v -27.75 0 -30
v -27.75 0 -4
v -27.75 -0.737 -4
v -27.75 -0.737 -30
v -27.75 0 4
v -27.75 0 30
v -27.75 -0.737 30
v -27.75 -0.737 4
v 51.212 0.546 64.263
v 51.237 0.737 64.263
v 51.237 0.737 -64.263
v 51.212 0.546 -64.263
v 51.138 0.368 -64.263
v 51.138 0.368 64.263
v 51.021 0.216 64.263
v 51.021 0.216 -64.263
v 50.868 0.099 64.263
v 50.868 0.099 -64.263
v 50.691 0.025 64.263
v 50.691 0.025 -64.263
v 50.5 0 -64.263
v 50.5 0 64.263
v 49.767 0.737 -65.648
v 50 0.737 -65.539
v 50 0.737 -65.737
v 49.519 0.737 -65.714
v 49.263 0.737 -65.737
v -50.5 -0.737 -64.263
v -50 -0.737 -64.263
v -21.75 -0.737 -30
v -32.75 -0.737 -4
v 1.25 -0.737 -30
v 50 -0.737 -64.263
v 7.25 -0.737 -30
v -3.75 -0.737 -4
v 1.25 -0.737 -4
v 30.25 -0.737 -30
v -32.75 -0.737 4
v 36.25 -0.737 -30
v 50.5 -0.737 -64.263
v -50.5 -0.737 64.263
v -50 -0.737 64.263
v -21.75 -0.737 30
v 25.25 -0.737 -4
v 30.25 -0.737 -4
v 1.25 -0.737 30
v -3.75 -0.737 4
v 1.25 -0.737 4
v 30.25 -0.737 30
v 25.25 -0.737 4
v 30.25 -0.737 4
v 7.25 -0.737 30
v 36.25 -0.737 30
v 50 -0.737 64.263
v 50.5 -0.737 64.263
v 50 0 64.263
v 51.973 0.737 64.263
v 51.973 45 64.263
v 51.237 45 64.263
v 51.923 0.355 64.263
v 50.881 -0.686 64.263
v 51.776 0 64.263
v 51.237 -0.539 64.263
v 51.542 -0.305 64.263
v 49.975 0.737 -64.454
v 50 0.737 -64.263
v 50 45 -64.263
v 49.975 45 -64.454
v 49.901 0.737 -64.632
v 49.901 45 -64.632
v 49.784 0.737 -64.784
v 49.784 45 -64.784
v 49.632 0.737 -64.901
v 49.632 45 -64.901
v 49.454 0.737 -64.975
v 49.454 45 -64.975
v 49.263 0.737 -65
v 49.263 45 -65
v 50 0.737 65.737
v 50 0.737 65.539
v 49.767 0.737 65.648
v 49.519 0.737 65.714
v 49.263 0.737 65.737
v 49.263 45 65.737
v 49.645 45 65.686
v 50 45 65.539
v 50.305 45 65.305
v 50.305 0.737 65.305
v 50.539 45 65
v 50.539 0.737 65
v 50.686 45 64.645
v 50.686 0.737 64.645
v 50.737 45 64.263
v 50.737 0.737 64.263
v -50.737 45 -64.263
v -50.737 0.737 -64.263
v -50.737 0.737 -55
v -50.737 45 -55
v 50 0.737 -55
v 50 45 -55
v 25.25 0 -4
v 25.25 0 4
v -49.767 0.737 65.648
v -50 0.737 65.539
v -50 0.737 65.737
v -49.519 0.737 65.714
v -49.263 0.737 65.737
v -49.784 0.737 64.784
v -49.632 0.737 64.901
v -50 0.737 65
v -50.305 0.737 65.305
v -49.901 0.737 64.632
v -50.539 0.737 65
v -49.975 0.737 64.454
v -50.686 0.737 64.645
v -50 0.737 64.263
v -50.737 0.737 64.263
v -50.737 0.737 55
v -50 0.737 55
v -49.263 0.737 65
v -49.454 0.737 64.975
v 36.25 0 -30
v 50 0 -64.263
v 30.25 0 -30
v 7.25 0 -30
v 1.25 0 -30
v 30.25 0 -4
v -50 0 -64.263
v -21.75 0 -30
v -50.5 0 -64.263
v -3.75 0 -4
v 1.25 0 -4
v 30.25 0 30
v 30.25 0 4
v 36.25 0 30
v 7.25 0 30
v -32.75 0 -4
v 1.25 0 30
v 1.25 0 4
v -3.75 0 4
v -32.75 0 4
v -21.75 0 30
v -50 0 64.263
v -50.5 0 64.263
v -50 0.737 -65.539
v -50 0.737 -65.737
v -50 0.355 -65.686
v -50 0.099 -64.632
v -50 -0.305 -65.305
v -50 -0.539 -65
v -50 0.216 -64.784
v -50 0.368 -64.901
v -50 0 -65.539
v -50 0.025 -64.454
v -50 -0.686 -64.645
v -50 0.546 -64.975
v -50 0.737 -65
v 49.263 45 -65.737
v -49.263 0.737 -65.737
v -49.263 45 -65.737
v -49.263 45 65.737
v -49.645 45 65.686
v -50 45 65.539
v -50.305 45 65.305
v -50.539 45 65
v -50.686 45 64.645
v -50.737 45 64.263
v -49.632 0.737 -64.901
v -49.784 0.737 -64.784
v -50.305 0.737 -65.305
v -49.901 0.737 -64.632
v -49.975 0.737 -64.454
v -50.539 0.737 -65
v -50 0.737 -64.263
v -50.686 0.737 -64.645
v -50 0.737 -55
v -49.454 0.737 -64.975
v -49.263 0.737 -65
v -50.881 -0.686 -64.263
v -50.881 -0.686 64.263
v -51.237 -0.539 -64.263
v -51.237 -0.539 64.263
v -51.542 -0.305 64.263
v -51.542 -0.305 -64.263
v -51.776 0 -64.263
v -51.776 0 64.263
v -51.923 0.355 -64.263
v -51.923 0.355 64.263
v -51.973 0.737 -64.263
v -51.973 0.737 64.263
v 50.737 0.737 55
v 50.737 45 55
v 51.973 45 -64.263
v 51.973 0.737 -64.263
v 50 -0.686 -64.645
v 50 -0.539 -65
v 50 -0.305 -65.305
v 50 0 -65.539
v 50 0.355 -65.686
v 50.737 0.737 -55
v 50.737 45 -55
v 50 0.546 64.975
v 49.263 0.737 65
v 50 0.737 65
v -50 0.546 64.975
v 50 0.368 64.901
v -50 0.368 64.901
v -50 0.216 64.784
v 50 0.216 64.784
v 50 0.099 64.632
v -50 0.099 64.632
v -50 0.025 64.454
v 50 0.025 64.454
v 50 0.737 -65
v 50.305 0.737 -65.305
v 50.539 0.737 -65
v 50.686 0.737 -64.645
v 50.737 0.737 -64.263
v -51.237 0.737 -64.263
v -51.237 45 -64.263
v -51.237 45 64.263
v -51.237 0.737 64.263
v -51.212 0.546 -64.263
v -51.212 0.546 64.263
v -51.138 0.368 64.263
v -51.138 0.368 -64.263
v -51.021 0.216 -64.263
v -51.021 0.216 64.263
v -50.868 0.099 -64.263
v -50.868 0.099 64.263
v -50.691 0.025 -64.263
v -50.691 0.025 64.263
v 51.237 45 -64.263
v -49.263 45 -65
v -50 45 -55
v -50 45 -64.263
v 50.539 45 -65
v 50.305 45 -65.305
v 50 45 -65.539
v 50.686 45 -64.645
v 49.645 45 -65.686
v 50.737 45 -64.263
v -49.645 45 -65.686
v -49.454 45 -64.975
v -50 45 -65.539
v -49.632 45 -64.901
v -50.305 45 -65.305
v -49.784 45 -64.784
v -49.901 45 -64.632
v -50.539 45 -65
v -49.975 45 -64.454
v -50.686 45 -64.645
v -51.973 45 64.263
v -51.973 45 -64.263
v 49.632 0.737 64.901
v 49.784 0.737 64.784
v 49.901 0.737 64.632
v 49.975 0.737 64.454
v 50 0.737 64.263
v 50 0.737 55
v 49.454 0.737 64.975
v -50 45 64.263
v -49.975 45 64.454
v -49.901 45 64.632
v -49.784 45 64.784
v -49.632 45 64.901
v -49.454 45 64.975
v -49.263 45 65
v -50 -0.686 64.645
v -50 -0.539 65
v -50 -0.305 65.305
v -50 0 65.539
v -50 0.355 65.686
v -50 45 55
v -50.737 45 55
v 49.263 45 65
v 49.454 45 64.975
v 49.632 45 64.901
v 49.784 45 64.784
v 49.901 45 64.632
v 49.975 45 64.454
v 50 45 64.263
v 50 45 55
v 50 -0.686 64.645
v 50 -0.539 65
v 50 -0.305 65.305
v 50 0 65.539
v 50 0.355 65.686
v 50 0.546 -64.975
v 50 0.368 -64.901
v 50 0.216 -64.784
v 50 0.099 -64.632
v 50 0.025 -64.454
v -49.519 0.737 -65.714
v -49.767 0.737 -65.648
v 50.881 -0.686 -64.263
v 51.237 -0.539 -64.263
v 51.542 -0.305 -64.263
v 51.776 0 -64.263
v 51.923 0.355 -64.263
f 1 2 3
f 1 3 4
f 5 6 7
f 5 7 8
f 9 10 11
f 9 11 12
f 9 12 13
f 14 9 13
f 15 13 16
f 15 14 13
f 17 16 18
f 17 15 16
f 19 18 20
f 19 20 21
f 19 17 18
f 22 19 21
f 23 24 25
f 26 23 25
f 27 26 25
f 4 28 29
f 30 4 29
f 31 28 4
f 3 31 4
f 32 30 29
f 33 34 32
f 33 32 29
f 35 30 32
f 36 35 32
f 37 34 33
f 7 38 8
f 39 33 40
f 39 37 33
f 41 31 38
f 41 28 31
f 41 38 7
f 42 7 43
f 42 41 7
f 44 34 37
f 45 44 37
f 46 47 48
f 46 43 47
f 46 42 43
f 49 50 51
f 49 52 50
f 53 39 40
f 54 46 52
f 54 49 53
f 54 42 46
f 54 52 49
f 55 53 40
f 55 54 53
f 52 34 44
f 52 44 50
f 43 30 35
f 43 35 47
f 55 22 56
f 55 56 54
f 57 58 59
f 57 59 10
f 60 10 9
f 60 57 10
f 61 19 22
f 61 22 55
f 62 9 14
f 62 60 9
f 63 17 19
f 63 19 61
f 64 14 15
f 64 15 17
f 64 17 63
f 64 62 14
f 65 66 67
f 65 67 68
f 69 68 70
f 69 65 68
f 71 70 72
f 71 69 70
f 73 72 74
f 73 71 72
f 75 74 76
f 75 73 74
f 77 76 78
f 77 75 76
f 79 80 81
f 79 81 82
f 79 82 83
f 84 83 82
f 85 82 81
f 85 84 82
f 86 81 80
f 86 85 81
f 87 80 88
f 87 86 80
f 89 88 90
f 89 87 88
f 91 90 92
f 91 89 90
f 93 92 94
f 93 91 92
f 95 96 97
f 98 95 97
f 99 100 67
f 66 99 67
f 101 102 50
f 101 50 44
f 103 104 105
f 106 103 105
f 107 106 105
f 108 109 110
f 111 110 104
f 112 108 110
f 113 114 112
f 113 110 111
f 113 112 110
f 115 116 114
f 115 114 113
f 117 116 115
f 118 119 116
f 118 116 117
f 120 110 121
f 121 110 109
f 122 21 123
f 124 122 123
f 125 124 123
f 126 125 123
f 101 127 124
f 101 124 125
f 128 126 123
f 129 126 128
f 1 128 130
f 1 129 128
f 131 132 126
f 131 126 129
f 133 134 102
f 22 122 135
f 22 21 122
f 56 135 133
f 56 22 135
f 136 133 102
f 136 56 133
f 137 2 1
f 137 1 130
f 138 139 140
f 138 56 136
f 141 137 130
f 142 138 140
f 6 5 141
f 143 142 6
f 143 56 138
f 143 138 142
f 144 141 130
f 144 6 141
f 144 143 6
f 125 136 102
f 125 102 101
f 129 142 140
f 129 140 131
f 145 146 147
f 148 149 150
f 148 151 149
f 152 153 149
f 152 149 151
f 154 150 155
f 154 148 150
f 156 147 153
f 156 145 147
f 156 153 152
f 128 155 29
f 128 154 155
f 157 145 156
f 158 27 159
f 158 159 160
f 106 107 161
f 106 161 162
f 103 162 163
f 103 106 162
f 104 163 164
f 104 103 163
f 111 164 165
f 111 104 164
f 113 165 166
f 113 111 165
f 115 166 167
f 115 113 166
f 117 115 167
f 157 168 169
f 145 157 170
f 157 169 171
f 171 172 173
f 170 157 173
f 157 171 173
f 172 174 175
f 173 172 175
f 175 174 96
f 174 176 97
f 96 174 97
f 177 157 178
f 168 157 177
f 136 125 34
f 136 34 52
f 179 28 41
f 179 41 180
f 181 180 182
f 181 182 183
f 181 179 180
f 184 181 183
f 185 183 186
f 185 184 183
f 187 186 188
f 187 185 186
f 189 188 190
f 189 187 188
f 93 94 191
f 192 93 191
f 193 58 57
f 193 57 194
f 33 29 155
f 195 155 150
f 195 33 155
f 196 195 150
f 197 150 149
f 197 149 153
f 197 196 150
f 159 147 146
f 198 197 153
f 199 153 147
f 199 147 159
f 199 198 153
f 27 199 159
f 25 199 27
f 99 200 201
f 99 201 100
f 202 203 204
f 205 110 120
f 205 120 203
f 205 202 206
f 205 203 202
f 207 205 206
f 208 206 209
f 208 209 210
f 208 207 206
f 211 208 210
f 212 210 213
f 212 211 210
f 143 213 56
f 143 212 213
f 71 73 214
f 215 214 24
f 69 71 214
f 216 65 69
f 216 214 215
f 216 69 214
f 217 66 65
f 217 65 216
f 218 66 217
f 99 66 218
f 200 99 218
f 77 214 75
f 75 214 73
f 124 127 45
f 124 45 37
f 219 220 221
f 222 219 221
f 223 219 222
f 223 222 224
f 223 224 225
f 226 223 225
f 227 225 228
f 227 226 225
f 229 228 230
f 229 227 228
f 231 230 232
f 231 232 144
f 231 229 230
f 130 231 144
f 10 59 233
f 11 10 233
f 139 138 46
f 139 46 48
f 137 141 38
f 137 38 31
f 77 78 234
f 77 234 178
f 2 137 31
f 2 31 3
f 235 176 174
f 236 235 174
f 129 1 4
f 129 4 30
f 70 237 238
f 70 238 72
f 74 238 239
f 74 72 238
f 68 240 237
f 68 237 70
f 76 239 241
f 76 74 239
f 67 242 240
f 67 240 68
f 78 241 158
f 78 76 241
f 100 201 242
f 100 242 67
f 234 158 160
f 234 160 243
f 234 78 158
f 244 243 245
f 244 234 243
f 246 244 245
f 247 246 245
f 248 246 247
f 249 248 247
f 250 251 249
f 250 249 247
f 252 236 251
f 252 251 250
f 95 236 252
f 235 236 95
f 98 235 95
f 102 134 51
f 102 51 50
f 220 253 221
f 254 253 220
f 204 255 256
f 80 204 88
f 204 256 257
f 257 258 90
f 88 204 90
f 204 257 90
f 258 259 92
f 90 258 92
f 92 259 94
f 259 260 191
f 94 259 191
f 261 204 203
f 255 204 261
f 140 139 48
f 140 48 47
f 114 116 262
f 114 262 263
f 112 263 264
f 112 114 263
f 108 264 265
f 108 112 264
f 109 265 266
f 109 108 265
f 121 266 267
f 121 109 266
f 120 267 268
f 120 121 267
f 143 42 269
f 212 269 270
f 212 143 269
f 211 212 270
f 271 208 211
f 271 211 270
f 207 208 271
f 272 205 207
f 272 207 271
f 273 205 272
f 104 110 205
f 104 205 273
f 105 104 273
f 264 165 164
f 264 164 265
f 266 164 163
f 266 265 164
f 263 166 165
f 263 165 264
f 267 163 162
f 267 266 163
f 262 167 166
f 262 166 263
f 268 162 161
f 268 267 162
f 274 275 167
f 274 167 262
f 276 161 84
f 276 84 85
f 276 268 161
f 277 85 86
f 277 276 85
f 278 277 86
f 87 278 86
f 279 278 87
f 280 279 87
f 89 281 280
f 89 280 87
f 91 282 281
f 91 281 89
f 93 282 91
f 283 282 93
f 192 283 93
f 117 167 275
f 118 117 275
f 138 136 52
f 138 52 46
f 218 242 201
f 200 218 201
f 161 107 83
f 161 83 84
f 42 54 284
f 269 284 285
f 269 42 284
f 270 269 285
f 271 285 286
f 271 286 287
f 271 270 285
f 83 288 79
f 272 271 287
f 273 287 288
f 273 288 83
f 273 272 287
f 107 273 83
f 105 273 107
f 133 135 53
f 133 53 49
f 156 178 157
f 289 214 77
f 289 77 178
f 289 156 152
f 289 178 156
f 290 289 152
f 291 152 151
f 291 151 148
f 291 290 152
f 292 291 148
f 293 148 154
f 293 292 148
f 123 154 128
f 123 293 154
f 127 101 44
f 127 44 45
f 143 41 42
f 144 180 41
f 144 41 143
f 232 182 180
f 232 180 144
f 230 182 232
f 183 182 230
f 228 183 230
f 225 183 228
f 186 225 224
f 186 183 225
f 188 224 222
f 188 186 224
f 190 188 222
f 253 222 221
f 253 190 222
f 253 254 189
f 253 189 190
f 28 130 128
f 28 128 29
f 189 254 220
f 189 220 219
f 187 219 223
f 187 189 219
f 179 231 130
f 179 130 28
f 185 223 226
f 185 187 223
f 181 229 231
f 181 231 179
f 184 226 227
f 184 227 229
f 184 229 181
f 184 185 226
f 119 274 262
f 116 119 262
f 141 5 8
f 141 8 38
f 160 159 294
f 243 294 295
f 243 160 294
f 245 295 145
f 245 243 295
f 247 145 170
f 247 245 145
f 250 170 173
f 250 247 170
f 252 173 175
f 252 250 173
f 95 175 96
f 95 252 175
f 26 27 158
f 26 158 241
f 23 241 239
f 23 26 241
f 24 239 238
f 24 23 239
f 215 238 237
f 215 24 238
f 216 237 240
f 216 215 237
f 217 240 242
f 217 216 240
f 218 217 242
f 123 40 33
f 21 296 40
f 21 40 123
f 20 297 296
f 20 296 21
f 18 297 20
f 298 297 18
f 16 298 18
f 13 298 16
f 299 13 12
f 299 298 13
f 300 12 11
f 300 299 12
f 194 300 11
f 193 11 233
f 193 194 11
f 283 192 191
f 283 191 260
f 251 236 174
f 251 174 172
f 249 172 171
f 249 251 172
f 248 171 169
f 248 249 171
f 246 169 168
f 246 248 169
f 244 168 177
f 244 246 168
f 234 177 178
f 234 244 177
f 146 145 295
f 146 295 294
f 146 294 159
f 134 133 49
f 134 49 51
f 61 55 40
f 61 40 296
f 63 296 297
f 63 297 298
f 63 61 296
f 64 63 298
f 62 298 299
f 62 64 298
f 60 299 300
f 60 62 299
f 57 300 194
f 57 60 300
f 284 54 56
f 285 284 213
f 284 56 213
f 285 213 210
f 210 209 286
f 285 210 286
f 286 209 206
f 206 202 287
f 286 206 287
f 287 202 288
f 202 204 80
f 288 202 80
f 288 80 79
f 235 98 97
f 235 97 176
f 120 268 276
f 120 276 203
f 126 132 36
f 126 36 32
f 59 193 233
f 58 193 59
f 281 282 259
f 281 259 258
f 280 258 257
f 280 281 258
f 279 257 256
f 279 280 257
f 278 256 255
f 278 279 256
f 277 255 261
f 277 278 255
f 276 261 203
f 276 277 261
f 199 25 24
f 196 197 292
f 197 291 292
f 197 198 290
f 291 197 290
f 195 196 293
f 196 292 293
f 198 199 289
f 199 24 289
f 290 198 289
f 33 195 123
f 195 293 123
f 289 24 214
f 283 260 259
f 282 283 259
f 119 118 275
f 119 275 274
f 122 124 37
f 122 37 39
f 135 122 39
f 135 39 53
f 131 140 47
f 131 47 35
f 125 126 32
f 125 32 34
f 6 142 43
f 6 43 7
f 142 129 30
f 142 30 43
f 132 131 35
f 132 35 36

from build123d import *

# Parameters (mm, degrees)
SKETCH1_W                        = 100
SKETCH1_H                        = 130
BASE_FLANGE1_DEPTH               = 0.7366
BOX_REAR_STRIP_W                 = 4.4196
BOX_REAR_STRIP_H                 = 0.7366
BOX_REAR_STRIP_CUT_DEPTH         = 100
BOX_REAR_DEPTH                   = 100
BOX_FRONT_STRIP_W                = 4.4196
BOX_FRONT_STRIP_H                = 0.7366
BOX_FRONT_STRIP_CUT_DEPTH        = 100
BOX_FRONT_DEPTH                  = 100
BOX_FRONT_TABS_STRIP_W           = 4.4196
BOX_FRONT_TABS_STRIP_H           = 0.7366
BOX_FRONT_TABS_STRIP_CUT_DEPTH   = 44.2634
BOX_FRONT_TABS_STRIP_2_W         = 4.4196
BOX_FRONT_TABS_STRIP_2_H         = 0.7366
BOX_FRONT_TABS_STRIP_CUT_2_DEPTH = 44.2634
BOX_FRONT_TABS_DEPTH             = 44.2634
BOX_FRONT_TABS_BEND_DEPTH        = 44.2634
BOX_REAR_TABS_STRIP_W            = 4.4196
BOX_REAR_TABS_STRIP_H            = 0.7366
BOX_REAR_TABS_STRIP_CUT_DEPTH    = 44.2634
BOX_REAR_TABS_STRIP_2_W          = 4.4196
BOX_REAR_TABS_STRIP_2_H          = 0.7366
BOX_REAR_TABS_STRIP_CUT_2_DEPTH  = 44.2634
BOX_REAR_TABS_DEPTH              = 44.2634
BOX_REAR_TABS_BEND_DEPTH         = 44.2634
EDGE_FLANGE6_DEPTH               = 128.5268
EDGE_FLANGE6_START               = 0.7366
EDGE_FLANGE6_FLAT_DEPTH          = 0.7366
EDGE_FLANGE6_BEND_DEPTH          = 128.5268
EDGE_FLANGE6_FLAT_2_DEPTH        = 0.7366


# Sheet-metal steps are written as plain solids
with BuildPart() as part:
    # Sketch1 → Base-Flange1 (new body)
    with BuildSketch(Plane(origin=(0, 0, 0), x_dir=(1, 0, 0), z_dir=(0, 1, 0))):
        Rectangle(SKETCH1_W, SKETCH1_H)
        Polygon((1.25, 30), (7.25, 30), (7.25, -30), (1.25, -30), (1.25, -4), (-3.75, -4), (-3.75, 4), (1.25, 4), align=None, mode=Mode.SUBTRACT)
        Polygon((30.25, 30), (36.25, 30), (36.25, -30), (30.25, -30), (30.25, -4), (25.25, -4), (25.25, 4), (30.25, 4), align=None, mode=Mode.SUBTRACT)
        Polygon((-27.75, 30), (-21.75, 30), (-21.75, -30), (-27.75, -30), (-27.75, -4), (-32.75, -4), (-32.75, 4), (-27.75, 4), align=None, mode=Mode.SUBTRACT)
    extrude(amount=-BASE_FLANGE1_DEPTH)

    # Box rear strip (across the edge) → Box rear strip cut (cut)
    with BuildSketch(Plane(origin=(50, 0, -65), x_dir=(0, 0, 1), z_dir=(-1, 0, 0))):
        with Locations((-1.4732, -0.3683)):
            Rectangle(BOX_REAR_STRIP_W, BOX_REAR_STRIP_H)
    extrude(amount=BOX_REAR_STRIP_CUT_DEPTH, mode=Mode.SUBTRACT)

    # Box rear section (across the edge) → Box rear (add)
    with BuildSketch(Plane(origin=(50, 0, -65), x_dir=(0, 0, 1), z_dir=(-1, 0, 0))):
        with BuildLine():
            Line((-0.7366, 0.7366), (-0.7366, 45))
            Line((-0.7366, 45), (0, 45))
            Line((0, 45), (0, 0.7366))
            ThreePointArc((0, 0.7366), (0.215745145, 0.215745145), (0.7366, 0))
            Line((0.7366, 0), (0.7366, -0.7366))
            ThreePointArc((0.7366, -0.7366), (-0.30510971, -0.30510971), (-0.7366, 0.7366))
        make_face()
    extrude(amount=BOX_REAR_DEPTH)

    # Box front strip (across the edge) → Box front strip cut (cut)
    with BuildSketch(Plane(origin=(-50, 0, 65), x_dir=(0, 0, -1), z_dir=(1, 0, 0))):
        with Locations((-1.4732, -0.3683)):
            Rectangle(BOX_FRONT_STRIP_W, BOX_FRONT_STRIP_H)
    extrude(amount=BOX_FRONT_STRIP_CUT_DEPTH, mode=Mode.SUBTRACT)

    # Box front section (across the edge) → Box front (add)
    with BuildSketch(Plane(origin=(-50, 0, 65), x_dir=(0, 0, -1), z_dir=(1, 0, 0))):
        with BuildLine():
            Line((-0.7366, 0.7366), (-0.7366, 45))
            Line((-0.7366, 45), (0, 45))
            Line((0, 45), (0, 0.7366))
            ThreePointArc((0, 0.7366), (0.215745145, 0.215745145), (0.7366, 0))
            Line((0.7366, 0), (0.7366, -0.7366))
            ThreePointArc((0.7366, -0.7366), (-0.30510971, -0.30510971), (-0.7366, 0.7366))
        make_face()
    extrude(amount=BOX_FRONT_DEPTH)

    # Box-front tabs strip (across the edge) → Box-front tabs strip cut (cut)
    with BuildSketch(Plane(origin=(-50, 0.7366, 65), x_dir=(1, 0, 0), z_dir=(0, 1, 0))):
        with Locations((-1.4732, -0.3683)):
            Rectangle(BOX_FRONT_TABS_STRIP_W, BOX_FRONT_TABS_STRIP_H)
    extrude(amount=BOX_FRONT_TABS_STRIP_CUT_DEPTH, mode=Mode.SUBTRACT)

    # Box-front tabs strip 2 (across the edge) → Box-front tabs strip cut 2 (cut)
    with BuildSketch(Plane(origin=(50, 45, 65), x_dir=(-1, 0, 0), z_dir=(0, -1, 0))):
        with Locations((-1.4732, -0.3683)):
            Rectangle(BOX_FRONT_TABS_STRIP_2_W, BOX_FRONT_TABS_STRIP_2_H)
    extrude(amount=BOX_FRONT_TABS_STRIP_CUT_2_DEPTH, mode=Mode.SUBTRACT)

    # Box-front tabs section (across the edge) → Box-front tabs (add)
    with BuildSketch(Plane(origin=(-50, 0.7366, 65), x_dir=(1, 0, 0), z_dir=(0, 1, 0))):
        with BuildLine():
            Line((-0.7366, 0.7366), (-0.7366, 10))
            Line((-0.7366, 10), (0, 10))
            Line((0, 10), (0, 0.7366))
            ThreePointArc((0, 0.7366), (0.215745145, 0.215745145), (0.7366, 0))
            Line((0.7366, 0), (0.7366, -0.7366))
            ThreePointArc((0.7366, -0.7366), (-0.30510971, -0.30510971), (-0.7366, 0.7366))
        make_face()
    extrude(amount=BOX_FRONT_TABS_DEPTH)

    # Box-front tabs section 2 (across the edge) → Box-front tabs bend (add)
    with BuildSketch(Plane(origin=(50, 45, 65), x_dir=(-1, 0, 0), z_dir=(0, -1, 0))):
        with BuildLine():
            Line((-0.7366, 0.7366), (-0.7366, 10))
            Line((-0.7366, 10), (0, 10))
            Line((0, 10), (0, 0.7366))
            ThreePointArc((0, 0.7366), (0.215745145, 0.215745145), (0.7366, 0))
            Line((0.7366, 0), (0.7366, -0.7366))
            ThreePointArc((0.7366, -0.7366), (-0.30510971, -0.30510971), (-0.7366, 0.7366))
        make_face()
    extrude(amount=BOX_FRONT_TABS_BEND_DEPTH)

    # Box-rear tabs strip (across the edge) → Box-rear tabs strip cut (cut)
    with BuildSketch(Plane(origin=(50, 0.7366, -65), x_dir=(-1, 0, 0), z_dir=(0, 1, 0))):
        with Locations((-1.4732, -0.3683)):
            Rectangle(BOX_REAR_TABS_STRIP_W, BOX_REAR_TABS_STRIP_H)
    extrude(amount=BOX_REAR_TABS_STRIP_CUT_DEPTH, mode=Mode.SUBTRACT)

    # Box-rear tabs strip 2 (across the edge) → Box-rear tabs strip cut 2 (cut)
    with BuildSketch(Plane(origin=(-50, 45, -65), x_dir=(1, 0, 0), z_dir=(0, -1, 0))):
        with Locations((-1.4732, -0.3683)):
            Rectangle(BOX_REAR_TABS_STRIP_2_W, BOX_REAR_TABS_STRIP_2_H)
    extrude(amount=BOX_REAR_TABS_STRIP_CUT_2_DEPTH, mode=Mode.SUBTRACT)

    # Box-rear tabs section (across the edge) → Box-rear tabs (add)
    with BuildSketch(Plane(origin=(50, 0.7366, -65), x_dir=(-1, 0, 0), z_dir=(0, 1, 0))):
        with BuildLine():
            Line((-0.7366, 0.7366), (-0.7366, 10))
            Line((-0.7366, 10), (0, 10))
            Line((0, 10), (0, 0.7366))
            ThreePointArc((0, 0.7366), (0.215745145, 0.215745145), (0.7366, 0))
            Line((0.7366, 0), (0.7366, -0.7366))
            ThreePointArc((0.7366, -0.7366), (-0.30510971, -0.30510971), (-0.7366, 0.7366))
        make_face()
    extrude(amount=BOX_REAR_TABS_DEPTH)

    # Box-rear tabs section 2 (across the edge) → Box-rear tabs bend (add)
    with BuildSketch(Plane(origin=(-50, 45, -65), x_dir=(1, 0, 0), z_dir=(0, -1, 0))):
        with BuildLine():
            Line((-0.7366, 0.7366), (-0.7366, 10))
            Line((-0.7366, 10), (0, 10))
            Line((0, 10), (0, 0.7366))
            ThreePointArc((0, 0.7366), (0.215745145, 0.215745145), (0.7366, 0))
            Line((0.7366, 0), (0.7366, -0.7366))
            ThreePointArc((0.7366, -0.7366), (-0.30510971, -0.30510971), (-0.7366, 0.7366))
        make_face()
    extrude(amount=BOX_REAR_TABS_BEND_DEPTH)

    # Edge-Flange6 bend section (across the edge) → Edge-Flange6 (add)
    with BuildSketch(Plane(origin=(-51.2366, 0, -64.2634), x_dir=(1, 0, 0), z_dir=(0, 0, 1))):
        with BuildLine():
            Line((-0.7366, 0.7366), (0, 0.7366))
            ThreePointArc((0, 0.7366), (0.215745145, 0.215745145), (0.7366, 0))
            Line((0.7366, 0), (1.2366, 0))
            Line((1.2366, 0), (1.2366, -0.7366))
            Line((1.2366, -0.7366), (0.7366, -0.7366))
            ThreePointArc((0.7366, -0.7366), (-0.30510971, -0.30510971), (-0.7366, 0.7366))
        make_face()
    extrude(amount=EDGE_FLANGE6_DEPTH)

    # Edge-Flange6 profile (on flange) → Edge-Flange6 flat (add)
    with BuildSketch(Plane.ZY.offset(51.2366).offset(EDGE_FLANGE6_START)):
        Polygon((-64.2634, 45), (-64.2634, 0.7366), (64.2634, 0.7366), (64.2634, 45), (-2.12, 45), align=None)
    extrude(amount=-EDGE_FLANGE6_FLAT_DEPTH)

    # Edge-Flange6 bend section 2 (across the edge) → Edge-Flange6 bend (add)
    with BuildSketch(Plane(origin=(51.2366, 0, 64.2634), x_dir=(-1, 0, 0), z_dir=(0, 0, -1))):
        with BuildLine():
            Line((-0.7366, 0.7366), (0, 0.7366))
            ThreePointArc((0, 0.7366), (0.215745145, 0.215745145), (0.7366, 0))
            Line((0.7366, 0), (1.2366, 0))
            Line((1.2366, 0), (1.2366, -0.7366))
            Line((1.2366, -0.7366), (0.7366, -0.7366))
            ThreePointArc((0.7366, -0.7366), (-0.30510971, -0.30510971), (-0.7366, 0.7366))
        make_face()
    extrude(amount=EDGE_FLANGE6_BEND_DEPTH)

    # Edge-Flange6 profile 2 (on flange) → Edge-Flange6 flat 2 (add)
    with BuildSketch(Plane(origin=(51.2366, 0, 0), x_dir=(0, 0, -1), z_dir=(1, 0, 0)).offset(EDGE_FLANGE6_START)):
        Polygon((-64.2634, 45), (-64.2634, 0.7366), (64.2634, 0.7366), (64.2634, 45), (-2.12, 45), align=None)
    extrude(amount=-EDGE_FLANGE6_FLAT_2_DEPTH)


solid = part.part
